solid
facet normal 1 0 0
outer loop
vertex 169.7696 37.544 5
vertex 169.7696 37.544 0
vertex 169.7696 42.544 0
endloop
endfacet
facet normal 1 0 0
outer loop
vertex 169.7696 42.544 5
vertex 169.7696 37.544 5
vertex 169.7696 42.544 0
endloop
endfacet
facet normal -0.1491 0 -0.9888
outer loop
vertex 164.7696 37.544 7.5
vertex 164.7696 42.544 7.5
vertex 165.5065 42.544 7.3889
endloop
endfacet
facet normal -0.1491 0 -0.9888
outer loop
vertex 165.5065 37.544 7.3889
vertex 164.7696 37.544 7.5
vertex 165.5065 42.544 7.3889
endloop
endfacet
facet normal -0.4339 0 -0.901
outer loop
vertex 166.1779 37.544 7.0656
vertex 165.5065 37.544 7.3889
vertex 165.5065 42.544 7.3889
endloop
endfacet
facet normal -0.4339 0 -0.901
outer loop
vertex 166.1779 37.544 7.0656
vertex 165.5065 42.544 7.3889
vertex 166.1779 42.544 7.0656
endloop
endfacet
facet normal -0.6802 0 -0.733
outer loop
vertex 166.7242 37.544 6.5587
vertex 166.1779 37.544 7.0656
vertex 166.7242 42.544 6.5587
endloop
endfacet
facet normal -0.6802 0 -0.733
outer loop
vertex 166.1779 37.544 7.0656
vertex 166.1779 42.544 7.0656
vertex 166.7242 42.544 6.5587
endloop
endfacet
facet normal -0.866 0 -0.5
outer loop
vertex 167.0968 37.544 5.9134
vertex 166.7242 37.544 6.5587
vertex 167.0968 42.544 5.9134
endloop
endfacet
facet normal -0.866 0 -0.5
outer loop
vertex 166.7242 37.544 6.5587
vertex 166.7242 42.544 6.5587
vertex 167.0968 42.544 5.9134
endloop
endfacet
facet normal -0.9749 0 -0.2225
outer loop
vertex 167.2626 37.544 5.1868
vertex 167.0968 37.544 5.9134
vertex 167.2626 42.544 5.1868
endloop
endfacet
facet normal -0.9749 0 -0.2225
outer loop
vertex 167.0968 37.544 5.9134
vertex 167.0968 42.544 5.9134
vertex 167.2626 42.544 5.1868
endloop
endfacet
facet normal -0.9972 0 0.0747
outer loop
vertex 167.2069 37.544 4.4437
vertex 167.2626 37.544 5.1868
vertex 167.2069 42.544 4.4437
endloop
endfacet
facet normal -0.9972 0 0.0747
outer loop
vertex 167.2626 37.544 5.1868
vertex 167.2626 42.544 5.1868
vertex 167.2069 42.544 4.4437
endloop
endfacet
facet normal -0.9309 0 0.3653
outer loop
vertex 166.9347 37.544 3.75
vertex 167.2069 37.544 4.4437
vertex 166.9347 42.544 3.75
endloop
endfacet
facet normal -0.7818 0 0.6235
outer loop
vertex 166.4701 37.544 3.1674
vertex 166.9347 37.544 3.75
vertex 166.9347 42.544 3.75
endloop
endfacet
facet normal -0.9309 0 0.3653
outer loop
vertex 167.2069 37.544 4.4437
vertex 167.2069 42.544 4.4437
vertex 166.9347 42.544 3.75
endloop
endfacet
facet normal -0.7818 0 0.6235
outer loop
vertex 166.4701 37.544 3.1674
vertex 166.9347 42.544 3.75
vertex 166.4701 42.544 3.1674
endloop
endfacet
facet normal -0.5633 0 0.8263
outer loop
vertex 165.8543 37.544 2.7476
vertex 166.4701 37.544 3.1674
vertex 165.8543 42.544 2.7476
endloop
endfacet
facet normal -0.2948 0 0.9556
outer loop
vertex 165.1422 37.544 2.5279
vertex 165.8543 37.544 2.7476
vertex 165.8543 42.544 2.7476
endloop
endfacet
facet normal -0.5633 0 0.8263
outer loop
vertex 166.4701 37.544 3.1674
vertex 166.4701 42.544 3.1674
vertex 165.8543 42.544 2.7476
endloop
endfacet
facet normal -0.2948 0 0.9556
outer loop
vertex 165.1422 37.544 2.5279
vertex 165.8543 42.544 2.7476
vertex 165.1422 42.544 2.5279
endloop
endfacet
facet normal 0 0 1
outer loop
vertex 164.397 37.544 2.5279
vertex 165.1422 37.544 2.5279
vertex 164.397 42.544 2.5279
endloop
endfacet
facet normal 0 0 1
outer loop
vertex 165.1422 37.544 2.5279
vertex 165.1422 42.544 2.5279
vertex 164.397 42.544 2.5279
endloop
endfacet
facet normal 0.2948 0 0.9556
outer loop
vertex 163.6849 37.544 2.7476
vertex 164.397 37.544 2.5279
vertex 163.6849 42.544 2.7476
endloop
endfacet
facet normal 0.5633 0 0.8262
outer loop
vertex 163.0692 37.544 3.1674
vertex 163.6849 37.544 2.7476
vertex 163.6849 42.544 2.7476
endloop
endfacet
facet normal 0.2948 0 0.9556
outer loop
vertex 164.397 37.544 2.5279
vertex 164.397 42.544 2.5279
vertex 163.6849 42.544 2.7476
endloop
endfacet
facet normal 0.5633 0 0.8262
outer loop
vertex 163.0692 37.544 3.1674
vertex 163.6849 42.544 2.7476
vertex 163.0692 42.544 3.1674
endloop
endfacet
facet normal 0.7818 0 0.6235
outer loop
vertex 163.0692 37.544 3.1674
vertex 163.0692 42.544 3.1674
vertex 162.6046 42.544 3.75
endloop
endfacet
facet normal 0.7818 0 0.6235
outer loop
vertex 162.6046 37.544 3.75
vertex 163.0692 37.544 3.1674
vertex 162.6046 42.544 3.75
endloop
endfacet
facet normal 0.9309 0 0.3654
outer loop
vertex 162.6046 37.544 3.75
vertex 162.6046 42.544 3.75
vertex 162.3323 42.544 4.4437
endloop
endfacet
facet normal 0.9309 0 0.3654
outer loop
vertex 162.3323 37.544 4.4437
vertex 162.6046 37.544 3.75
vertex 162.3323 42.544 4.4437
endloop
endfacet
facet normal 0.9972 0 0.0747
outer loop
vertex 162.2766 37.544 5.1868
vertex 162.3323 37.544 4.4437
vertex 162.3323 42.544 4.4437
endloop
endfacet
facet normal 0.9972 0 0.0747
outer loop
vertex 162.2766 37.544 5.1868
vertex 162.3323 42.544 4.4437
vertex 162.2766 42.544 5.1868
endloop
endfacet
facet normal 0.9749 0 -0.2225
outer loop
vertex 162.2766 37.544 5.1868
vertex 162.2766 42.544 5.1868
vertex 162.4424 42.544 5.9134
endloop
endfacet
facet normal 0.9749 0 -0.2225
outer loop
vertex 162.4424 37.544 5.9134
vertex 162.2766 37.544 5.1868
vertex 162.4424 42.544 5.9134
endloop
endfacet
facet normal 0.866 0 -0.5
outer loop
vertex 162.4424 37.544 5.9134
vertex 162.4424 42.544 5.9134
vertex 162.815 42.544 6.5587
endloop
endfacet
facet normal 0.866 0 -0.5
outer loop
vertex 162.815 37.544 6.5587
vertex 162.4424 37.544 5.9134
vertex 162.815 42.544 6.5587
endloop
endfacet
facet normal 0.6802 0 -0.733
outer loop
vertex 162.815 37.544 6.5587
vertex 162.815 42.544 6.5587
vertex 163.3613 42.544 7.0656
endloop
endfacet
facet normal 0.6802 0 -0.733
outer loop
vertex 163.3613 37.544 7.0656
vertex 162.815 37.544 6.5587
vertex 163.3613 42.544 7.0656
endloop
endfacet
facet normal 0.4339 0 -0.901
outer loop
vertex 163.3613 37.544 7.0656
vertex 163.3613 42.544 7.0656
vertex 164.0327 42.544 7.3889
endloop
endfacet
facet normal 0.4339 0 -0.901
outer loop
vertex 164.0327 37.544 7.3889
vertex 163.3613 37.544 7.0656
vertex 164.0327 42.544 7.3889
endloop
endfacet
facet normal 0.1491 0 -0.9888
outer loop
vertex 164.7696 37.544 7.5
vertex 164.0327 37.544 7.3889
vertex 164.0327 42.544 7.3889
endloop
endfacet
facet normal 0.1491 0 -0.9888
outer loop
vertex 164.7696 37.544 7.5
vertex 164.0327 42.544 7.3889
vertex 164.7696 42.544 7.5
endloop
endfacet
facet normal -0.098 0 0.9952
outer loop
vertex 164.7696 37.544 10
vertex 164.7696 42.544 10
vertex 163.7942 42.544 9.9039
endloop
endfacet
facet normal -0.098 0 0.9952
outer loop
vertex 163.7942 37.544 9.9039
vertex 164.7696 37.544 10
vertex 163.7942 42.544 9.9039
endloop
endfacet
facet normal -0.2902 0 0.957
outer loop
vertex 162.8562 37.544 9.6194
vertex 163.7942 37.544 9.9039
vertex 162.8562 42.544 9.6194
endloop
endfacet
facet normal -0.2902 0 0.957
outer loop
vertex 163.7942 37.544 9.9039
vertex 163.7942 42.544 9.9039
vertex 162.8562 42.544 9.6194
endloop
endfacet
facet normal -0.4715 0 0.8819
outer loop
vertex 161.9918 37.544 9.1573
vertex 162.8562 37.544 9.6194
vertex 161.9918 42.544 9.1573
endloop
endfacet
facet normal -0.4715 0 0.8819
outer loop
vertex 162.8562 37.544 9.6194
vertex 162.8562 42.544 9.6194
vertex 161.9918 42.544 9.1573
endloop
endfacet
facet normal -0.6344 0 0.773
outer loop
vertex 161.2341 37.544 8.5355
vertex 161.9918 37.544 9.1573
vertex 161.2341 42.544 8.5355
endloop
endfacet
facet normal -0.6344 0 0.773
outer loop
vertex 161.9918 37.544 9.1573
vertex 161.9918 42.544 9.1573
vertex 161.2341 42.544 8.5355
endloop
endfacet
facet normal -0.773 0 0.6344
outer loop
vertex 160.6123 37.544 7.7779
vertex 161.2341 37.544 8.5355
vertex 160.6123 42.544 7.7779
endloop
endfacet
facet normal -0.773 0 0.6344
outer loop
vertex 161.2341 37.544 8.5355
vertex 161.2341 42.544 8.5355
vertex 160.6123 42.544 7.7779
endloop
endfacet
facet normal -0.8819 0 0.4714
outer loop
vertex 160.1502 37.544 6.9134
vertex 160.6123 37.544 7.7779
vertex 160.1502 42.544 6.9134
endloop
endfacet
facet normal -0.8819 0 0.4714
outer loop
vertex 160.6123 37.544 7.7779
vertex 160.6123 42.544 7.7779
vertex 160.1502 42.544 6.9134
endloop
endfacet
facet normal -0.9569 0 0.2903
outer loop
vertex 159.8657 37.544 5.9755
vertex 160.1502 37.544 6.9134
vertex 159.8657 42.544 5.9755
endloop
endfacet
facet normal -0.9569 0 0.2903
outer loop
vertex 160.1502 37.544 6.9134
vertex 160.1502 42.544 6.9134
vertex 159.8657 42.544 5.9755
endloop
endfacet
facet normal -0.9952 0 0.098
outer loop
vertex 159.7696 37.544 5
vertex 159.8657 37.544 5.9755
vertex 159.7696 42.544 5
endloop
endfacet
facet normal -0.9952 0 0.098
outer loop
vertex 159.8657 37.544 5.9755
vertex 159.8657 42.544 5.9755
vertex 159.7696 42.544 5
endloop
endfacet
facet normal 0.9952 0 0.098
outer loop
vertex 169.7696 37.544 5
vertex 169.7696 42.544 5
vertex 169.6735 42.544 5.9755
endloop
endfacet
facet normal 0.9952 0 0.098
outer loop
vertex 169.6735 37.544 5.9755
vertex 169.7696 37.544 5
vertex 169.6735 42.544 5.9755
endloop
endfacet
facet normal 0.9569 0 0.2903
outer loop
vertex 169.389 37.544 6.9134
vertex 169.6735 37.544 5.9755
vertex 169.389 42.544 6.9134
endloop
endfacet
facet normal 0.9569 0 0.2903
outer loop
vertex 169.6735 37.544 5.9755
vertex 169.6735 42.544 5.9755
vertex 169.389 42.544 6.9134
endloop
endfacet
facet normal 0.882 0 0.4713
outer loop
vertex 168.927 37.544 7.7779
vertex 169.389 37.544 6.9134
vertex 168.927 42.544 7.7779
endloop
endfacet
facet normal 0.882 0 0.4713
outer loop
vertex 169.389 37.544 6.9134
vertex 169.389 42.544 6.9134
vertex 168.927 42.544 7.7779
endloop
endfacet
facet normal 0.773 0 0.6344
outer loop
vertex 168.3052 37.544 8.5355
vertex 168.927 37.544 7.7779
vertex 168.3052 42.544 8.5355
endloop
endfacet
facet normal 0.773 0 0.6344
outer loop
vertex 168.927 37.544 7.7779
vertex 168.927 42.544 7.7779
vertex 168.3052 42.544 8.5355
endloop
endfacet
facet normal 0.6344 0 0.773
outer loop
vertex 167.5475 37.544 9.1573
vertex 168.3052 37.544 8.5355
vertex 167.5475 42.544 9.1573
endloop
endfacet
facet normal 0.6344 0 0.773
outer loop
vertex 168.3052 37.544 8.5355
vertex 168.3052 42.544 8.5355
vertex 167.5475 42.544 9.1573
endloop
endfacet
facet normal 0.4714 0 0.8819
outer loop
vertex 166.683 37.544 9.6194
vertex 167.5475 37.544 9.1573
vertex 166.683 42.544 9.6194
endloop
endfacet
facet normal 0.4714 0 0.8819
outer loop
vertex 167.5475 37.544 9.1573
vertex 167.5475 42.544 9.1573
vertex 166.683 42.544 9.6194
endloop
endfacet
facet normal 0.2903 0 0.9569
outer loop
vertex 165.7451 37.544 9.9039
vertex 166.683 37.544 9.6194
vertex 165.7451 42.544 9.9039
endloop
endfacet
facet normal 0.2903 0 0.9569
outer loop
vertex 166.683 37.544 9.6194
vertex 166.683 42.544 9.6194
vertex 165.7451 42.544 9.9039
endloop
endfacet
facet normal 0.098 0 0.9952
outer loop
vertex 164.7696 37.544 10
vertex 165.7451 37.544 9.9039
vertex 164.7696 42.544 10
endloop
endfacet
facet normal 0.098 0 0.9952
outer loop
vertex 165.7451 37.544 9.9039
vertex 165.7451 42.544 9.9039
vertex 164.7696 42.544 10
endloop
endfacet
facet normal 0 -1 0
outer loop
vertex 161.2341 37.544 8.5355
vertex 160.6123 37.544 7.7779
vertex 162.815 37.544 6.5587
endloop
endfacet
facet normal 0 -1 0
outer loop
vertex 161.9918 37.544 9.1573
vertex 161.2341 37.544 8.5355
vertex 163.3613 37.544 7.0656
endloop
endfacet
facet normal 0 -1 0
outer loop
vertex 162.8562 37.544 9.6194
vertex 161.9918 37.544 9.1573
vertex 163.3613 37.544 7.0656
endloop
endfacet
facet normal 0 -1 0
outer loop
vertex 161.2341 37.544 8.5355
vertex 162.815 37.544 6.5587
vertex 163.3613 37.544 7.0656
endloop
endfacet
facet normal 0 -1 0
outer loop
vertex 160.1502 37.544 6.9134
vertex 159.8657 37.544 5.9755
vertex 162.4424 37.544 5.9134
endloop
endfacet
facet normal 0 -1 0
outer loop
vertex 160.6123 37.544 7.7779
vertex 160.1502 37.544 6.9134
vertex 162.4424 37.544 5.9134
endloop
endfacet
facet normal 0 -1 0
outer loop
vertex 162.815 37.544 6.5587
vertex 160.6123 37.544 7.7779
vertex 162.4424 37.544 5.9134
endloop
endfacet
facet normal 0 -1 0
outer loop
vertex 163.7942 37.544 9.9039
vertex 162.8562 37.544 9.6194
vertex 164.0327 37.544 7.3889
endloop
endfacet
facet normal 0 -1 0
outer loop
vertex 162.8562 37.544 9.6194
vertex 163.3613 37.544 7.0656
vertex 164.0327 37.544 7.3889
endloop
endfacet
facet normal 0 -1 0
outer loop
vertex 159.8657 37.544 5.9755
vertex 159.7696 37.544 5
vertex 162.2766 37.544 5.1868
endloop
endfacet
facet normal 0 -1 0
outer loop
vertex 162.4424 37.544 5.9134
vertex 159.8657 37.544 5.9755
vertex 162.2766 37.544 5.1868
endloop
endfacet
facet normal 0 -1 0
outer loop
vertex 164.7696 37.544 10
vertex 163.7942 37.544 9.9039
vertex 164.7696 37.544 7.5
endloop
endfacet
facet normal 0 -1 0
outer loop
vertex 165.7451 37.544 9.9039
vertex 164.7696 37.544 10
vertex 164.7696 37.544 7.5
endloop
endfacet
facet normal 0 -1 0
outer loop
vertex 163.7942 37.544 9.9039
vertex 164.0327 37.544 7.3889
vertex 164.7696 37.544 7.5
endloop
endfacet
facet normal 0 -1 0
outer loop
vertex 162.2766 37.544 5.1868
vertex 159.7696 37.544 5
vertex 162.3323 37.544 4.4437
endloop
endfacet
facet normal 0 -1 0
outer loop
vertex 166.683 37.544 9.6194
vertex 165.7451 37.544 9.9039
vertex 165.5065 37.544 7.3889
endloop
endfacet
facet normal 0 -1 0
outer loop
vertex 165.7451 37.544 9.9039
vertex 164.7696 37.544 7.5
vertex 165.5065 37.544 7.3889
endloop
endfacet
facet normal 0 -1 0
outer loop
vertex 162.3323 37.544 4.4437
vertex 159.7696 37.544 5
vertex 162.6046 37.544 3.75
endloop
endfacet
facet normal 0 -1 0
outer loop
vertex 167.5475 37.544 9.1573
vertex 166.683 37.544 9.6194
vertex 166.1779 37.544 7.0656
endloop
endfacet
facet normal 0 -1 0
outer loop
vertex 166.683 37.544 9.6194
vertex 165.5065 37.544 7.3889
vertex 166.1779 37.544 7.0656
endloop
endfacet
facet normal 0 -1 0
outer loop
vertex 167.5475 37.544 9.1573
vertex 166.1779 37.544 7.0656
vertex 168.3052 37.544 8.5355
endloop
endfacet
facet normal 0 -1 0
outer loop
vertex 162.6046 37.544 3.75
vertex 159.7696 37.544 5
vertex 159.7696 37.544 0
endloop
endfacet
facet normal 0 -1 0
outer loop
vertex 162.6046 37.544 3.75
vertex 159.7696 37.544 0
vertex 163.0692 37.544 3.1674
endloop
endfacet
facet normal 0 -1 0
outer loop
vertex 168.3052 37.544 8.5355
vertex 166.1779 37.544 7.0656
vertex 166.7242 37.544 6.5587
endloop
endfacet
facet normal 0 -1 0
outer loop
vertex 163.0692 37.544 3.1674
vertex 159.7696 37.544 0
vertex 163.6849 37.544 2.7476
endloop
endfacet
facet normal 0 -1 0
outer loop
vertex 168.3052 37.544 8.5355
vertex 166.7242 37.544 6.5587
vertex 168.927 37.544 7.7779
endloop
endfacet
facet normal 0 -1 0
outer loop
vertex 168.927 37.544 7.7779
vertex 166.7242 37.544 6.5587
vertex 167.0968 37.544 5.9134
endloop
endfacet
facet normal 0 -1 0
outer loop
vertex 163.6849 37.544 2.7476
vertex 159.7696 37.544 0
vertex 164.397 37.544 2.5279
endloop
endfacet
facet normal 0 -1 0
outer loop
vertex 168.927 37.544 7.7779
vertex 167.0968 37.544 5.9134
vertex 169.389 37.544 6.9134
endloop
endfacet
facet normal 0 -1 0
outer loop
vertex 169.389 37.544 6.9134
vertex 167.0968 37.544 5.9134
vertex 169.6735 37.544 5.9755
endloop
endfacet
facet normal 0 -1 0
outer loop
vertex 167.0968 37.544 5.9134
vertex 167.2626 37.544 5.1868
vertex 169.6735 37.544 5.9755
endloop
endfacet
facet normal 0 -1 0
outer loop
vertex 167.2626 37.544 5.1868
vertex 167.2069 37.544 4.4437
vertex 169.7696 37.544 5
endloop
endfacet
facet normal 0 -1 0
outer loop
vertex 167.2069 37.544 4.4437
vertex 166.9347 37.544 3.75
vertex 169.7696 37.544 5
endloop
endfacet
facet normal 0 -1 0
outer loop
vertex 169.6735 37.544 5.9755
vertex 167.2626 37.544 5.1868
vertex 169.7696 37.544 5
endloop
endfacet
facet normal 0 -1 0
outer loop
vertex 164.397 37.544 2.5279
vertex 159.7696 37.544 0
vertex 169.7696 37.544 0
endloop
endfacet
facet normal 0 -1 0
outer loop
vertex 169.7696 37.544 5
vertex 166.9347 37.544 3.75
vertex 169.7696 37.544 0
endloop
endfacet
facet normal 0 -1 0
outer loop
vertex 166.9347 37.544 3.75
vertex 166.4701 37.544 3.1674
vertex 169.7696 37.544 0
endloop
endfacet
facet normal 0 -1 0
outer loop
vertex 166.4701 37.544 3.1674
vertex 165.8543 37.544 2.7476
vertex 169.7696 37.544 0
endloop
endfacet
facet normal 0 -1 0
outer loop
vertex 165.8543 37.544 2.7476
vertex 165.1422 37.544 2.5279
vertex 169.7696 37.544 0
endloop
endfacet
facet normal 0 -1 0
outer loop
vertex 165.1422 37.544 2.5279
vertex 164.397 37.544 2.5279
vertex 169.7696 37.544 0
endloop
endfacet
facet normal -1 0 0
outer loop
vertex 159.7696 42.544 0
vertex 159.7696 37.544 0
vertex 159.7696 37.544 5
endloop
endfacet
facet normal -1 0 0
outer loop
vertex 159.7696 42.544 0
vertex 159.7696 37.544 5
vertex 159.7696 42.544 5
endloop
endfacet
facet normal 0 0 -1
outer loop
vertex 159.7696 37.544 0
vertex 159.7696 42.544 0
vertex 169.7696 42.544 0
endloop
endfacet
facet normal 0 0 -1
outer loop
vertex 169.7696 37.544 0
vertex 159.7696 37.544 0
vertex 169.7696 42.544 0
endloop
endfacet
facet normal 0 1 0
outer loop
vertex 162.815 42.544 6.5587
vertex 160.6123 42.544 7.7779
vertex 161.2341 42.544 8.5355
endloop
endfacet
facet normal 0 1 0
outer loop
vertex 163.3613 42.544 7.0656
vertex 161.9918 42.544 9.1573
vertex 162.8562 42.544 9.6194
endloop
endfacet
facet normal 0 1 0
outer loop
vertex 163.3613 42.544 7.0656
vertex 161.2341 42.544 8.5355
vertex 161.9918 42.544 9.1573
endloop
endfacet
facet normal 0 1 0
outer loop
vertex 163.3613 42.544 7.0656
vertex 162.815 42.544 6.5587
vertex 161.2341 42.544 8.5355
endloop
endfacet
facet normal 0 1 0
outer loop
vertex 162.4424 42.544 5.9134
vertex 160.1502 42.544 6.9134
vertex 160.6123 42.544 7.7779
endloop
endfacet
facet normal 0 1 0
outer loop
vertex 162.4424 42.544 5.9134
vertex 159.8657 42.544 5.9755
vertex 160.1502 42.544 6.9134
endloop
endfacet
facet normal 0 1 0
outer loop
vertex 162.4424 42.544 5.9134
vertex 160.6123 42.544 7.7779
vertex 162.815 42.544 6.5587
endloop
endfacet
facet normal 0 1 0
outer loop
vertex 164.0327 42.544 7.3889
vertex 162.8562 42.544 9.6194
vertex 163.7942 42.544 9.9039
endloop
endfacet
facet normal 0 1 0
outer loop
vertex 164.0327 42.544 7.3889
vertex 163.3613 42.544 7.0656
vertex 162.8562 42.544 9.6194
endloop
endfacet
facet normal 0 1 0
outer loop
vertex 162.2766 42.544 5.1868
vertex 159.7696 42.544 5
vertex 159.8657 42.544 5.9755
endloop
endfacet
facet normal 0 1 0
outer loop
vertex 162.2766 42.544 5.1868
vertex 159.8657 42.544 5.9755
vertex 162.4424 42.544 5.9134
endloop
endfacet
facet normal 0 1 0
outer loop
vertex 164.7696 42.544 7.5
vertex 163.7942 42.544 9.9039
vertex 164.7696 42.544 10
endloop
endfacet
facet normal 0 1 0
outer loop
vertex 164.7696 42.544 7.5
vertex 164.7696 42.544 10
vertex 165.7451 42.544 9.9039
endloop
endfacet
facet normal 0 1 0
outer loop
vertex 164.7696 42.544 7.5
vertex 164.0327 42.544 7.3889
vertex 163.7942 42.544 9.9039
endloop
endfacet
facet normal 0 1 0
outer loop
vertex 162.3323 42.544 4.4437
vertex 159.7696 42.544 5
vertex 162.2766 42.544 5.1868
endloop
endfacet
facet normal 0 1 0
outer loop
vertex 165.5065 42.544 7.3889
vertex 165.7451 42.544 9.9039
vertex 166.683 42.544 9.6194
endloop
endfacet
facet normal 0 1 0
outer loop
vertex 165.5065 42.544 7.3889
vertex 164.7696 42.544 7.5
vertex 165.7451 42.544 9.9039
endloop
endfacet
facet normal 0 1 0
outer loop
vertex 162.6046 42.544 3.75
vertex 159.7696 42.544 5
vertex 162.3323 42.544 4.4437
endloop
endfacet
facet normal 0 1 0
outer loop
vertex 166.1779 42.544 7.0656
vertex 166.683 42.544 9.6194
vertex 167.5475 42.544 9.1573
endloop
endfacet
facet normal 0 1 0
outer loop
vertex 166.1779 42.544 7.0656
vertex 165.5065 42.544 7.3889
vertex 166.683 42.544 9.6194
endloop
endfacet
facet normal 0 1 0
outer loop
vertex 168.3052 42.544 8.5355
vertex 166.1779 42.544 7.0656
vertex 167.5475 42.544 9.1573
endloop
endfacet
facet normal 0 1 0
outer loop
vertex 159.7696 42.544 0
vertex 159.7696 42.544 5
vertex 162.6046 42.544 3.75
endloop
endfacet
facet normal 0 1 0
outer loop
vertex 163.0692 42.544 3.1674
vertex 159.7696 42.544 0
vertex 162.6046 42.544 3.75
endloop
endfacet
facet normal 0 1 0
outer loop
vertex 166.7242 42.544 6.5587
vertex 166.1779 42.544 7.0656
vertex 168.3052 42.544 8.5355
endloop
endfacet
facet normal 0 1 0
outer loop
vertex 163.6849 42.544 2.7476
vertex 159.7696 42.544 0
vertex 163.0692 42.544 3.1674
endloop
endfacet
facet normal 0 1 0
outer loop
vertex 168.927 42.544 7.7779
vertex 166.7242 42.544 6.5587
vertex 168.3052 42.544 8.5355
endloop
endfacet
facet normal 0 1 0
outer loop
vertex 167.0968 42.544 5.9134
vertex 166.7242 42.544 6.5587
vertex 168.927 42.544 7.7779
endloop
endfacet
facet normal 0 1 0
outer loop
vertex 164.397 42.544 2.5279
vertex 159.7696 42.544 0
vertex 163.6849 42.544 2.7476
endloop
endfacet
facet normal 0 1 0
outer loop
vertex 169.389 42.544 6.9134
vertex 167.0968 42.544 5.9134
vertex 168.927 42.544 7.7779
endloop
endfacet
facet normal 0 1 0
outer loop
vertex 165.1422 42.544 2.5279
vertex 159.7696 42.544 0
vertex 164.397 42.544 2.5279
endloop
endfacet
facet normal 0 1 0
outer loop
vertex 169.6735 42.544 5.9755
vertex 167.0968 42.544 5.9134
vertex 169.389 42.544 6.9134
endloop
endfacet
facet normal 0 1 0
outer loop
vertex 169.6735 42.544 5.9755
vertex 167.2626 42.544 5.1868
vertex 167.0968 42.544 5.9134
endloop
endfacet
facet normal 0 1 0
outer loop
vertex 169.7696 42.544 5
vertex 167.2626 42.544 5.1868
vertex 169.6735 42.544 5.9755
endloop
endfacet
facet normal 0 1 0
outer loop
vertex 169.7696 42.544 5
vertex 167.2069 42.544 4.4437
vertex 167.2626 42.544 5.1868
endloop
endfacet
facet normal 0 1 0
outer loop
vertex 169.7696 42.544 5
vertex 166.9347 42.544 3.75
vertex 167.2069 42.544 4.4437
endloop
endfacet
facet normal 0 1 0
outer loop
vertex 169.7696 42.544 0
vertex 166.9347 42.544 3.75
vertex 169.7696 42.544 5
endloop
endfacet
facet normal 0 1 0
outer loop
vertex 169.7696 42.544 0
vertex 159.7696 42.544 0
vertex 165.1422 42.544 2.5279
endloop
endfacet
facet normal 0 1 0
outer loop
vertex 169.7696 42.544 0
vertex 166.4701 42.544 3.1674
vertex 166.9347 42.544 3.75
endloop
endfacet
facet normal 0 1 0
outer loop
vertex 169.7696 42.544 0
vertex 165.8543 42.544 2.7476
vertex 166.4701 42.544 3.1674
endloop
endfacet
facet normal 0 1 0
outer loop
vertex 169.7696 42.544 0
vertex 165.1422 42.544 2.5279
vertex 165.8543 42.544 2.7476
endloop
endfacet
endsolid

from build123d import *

# Parameters (mm, degrees)
SKETCH1_W           = 10
SKETCH1_H           = 5
BOSS_EXTRUDE1_DEPTH = 10
SKETCH2_R           = 2.5
CUT_EXTRUDE1_DEPTH  = 171.137369091


with BuildPart() as part:
    # Sketch1 → Boss-Extrude1 (new body)
    with BuildSketch(Plane.XY):
        with Locations((164.769621432, 40.044015335)):
            Rectangle(SKETCH1_W, SKETCH1_H)
    extrude(amount=BOSS_EXTRUDE1_DEPTH)

    # Sketch2 → Cut-Extrude1 (cut, through all)
    with BuildSketch(Plane(origin=(0, 42.544015335, 0), x_dir=(1, 0, 0), z_dir=(0, 1, 0))):
        with BuildLine():
            ThreePointArc((164.769621432, -10), (161.234087527, -8.535533906), (159.769621432, -5))
            Line((159.769621432, -5), (159.769621432, -10))
            Line((159.769621432, -10), (164.769621432, -10))
        make_face()
        with BuildLine():
            ThreePointArc((169.769621432, -5), (168.305155338, -8.535533906), (164.769621432, -10))
            Line((164.769621432, -10), (169.769621432, -10))
            Line((169.769621432, -10), (169.769621432, -5))
        make_face()
        with Locations((164.769621432, -5)):
            Circle(SKETCH2_R)
    extrude(amount=-CUT_EXTRUDE1_DEPTH, mode=Mode.SUBTRACT)


solid = part.part
